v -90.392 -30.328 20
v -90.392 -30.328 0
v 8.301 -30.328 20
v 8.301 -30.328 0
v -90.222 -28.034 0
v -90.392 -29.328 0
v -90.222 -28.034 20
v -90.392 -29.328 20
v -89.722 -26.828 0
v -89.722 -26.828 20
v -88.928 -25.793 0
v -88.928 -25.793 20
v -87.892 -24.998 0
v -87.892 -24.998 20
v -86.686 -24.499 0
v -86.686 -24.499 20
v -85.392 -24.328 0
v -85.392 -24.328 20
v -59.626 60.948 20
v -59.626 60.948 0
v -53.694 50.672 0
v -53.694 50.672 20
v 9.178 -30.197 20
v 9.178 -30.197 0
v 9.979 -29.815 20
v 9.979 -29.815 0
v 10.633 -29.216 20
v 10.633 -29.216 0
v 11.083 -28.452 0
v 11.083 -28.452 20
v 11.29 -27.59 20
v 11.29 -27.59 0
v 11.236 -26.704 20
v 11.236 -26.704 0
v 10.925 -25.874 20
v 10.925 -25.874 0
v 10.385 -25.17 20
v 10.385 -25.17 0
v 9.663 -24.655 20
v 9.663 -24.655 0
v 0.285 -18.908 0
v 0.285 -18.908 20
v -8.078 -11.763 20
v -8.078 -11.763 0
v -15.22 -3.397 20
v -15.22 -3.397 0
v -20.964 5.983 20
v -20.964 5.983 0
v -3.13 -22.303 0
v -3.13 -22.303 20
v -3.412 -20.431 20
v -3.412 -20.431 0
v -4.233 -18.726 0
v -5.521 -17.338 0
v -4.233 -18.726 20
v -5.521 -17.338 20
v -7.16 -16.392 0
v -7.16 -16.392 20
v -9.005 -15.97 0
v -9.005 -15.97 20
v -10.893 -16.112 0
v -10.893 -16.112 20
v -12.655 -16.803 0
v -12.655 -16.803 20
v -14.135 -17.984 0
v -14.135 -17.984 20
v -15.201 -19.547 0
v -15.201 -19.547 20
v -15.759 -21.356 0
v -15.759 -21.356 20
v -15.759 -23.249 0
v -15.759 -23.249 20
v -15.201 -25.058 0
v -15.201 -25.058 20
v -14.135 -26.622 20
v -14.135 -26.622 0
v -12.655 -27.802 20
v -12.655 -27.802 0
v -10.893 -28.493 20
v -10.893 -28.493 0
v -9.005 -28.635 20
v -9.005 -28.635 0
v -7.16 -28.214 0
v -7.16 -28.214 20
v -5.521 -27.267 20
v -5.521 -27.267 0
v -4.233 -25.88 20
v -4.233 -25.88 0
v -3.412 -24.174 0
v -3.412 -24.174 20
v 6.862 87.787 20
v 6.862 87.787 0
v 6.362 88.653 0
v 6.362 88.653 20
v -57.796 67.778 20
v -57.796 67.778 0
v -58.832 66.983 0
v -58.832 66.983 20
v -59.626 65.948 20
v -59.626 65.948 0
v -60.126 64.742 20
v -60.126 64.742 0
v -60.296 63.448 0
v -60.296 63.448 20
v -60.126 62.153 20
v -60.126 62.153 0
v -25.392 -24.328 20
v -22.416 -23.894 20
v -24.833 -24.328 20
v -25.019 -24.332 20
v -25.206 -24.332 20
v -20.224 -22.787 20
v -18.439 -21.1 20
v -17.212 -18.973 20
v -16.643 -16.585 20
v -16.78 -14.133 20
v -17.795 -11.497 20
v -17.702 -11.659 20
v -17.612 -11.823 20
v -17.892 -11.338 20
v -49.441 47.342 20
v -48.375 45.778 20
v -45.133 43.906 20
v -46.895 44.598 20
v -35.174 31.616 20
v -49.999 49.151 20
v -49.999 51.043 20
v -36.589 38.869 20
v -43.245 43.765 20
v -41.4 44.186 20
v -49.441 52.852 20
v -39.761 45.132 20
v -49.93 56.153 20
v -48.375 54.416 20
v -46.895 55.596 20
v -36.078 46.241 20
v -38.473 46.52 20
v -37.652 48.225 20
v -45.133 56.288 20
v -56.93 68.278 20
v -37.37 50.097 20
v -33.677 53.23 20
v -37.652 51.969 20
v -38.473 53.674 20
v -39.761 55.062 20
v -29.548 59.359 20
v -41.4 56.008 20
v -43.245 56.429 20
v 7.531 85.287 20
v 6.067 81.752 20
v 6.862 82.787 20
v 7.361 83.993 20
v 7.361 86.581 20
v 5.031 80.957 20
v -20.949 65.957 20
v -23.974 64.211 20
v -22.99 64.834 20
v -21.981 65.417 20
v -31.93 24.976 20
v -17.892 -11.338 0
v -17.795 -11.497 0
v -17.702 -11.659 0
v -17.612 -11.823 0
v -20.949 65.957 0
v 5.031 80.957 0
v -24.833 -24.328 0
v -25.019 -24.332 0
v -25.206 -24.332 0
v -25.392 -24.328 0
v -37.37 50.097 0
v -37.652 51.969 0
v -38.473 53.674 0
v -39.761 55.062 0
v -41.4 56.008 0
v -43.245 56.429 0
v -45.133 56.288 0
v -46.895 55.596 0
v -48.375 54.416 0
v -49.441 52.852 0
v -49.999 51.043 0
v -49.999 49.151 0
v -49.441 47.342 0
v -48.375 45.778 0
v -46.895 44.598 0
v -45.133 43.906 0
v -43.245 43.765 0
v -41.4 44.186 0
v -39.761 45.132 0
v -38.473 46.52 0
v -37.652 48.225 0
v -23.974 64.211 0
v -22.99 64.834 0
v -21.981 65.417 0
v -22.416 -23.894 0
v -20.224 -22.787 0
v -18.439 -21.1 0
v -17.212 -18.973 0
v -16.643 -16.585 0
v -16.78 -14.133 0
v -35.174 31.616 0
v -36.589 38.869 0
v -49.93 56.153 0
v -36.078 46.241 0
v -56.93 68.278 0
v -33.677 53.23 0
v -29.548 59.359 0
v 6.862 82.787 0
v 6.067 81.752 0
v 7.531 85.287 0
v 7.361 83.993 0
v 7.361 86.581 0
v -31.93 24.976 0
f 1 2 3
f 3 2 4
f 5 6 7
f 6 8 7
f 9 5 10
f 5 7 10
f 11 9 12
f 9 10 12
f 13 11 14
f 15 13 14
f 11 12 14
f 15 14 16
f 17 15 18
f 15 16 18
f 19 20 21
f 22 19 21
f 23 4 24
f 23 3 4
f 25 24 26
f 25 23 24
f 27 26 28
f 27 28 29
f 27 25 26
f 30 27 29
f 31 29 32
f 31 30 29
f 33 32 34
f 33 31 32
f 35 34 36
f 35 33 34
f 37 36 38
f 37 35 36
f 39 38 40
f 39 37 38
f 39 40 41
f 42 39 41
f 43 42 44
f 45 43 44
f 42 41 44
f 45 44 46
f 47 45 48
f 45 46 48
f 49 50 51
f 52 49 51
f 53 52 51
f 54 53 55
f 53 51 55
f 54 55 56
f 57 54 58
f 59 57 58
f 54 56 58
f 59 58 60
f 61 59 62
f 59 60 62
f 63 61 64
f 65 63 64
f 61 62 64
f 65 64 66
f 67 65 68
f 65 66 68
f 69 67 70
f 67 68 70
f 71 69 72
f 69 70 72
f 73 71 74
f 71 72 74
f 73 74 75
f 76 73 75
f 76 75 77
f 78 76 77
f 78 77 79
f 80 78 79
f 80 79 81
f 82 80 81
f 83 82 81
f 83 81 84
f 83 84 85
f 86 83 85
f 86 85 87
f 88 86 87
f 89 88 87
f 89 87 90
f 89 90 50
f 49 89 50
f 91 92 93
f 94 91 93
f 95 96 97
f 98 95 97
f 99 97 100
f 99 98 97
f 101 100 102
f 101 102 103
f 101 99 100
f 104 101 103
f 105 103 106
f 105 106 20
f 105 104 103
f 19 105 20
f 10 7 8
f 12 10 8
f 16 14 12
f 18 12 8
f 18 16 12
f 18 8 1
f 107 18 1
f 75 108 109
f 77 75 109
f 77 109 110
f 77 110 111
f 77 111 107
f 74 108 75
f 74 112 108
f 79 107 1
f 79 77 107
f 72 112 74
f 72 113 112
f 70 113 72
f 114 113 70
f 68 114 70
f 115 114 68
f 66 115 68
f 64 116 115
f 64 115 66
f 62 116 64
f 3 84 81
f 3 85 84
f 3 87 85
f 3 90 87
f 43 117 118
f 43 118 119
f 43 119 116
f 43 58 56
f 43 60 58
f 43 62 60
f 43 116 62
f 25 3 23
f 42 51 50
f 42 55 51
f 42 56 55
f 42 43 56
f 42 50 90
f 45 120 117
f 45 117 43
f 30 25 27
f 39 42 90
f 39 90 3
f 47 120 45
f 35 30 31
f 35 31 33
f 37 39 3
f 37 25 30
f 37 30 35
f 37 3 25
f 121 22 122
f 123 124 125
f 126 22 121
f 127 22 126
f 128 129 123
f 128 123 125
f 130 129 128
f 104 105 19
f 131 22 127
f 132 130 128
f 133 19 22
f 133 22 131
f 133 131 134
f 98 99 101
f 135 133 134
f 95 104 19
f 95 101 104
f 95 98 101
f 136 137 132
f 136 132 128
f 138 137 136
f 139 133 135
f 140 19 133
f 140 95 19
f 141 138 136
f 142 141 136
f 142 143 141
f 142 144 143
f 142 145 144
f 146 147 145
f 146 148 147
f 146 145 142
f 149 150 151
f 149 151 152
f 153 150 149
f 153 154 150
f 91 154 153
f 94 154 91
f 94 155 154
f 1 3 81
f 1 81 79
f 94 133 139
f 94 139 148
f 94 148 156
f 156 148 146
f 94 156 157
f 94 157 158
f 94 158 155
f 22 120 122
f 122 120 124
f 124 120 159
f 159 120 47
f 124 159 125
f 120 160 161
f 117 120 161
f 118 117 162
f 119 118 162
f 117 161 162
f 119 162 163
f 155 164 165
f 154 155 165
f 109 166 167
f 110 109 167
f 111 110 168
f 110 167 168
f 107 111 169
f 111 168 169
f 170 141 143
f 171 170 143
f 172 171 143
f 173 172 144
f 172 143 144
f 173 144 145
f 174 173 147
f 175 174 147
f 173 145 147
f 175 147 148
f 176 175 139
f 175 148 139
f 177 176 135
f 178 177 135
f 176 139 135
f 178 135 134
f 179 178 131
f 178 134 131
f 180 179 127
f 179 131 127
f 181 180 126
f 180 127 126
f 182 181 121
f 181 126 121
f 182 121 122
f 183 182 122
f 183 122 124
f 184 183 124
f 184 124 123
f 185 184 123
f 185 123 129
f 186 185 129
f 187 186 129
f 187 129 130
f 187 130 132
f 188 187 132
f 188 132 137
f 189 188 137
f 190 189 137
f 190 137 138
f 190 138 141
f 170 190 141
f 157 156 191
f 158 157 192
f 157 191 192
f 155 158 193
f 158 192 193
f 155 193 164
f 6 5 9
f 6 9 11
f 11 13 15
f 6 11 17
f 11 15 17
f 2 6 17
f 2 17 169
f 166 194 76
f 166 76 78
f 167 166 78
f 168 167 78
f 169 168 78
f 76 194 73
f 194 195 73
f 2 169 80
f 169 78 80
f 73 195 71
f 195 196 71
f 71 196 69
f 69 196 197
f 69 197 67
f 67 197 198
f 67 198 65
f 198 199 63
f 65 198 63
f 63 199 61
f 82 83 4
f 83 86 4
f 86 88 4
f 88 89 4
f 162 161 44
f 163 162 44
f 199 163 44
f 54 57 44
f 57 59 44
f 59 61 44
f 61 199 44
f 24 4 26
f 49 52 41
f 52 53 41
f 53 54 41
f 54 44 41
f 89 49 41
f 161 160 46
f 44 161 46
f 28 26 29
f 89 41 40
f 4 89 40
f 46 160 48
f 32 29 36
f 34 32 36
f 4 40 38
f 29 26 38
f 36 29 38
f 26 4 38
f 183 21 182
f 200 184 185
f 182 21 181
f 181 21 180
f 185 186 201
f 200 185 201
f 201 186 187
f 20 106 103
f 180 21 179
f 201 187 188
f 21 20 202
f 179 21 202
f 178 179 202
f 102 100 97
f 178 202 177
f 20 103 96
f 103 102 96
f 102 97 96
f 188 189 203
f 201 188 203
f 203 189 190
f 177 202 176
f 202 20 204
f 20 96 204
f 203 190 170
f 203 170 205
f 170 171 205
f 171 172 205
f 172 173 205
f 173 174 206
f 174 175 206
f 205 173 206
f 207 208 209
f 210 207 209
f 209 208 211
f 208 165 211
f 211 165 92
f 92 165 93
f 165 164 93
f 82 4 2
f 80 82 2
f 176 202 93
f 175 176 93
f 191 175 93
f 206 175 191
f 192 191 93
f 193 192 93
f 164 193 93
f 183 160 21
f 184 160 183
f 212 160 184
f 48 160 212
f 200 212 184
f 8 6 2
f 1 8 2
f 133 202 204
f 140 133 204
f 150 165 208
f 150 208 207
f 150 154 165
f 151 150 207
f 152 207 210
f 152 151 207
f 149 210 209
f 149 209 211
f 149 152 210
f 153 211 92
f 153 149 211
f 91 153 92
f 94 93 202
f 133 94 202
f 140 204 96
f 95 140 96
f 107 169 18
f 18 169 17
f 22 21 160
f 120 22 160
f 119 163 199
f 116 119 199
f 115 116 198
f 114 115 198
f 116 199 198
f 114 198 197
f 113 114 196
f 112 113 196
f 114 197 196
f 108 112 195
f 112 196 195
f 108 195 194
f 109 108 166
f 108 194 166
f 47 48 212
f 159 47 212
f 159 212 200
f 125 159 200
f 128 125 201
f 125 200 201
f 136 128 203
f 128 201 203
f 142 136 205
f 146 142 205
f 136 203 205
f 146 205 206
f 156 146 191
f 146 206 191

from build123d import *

# Parameters (mm, degrees)
F1_DEPTH = 20
F2_R     = 5
F3_R     = 6.35
F4_DEPTH = 25
F5_R     = 3


# Not quite as in the source:
# - a feature names something its author has since deleted; it is built from what else it names


with BuildPart() as f1:
    # F0 (on Top) → F1 (new body)
    with BuildSketch(Plane.XY):
        with BuildLine():
            Line((-90.3923048454, -24.3281582892), (-90.392, -30.3281582892))
            Line((-90.392, -30.3281582892), (0, -30.3281582892))
            Line((0, -30.3281582892), (25, -30.3281582892))
            ThreePointArc((25, -30.3281582892), (-1.9589555892, -17.2068745453), (-20.9641016151, 5.9827308433))
            Line((-20.9641016151, 5.9827308433), (-31.9301010618, 24.9763990407))
            ThreePointArc((-31.9301010618, 24.9763990407), (-36.0778921244, 46.2412468008), (-23.9743052597, 64.2106960401))
            ThreePointArc((-23.9743052597, 64.2106960401), (-22.4887853878, 65.1306303747), (-20.9493389483, 65.9571611543))
            Line((-20.9493389483, 65.9571611543), (9.3615501841, 83.4571611543))
            Line((9.3615501841, 83.4571611543), (6.3615501841, 88.653313577))
            Line((6.3615501841, 88.653313577), (-49.9301010618, 56.153313577))
            Line((-49.9301010618, 56.153313577), (-56.9301010618, 68.2776692299))
            Line((-56.9301010618, 68.2776692299), (-62.1262534846, 65.2776692299))
            Line((-62.1262534846, 65.2776692299), (-53.6935750346, 50.6718417108))
            Line((-53.6935750346, 50.6718417108), (-17.8923048454, -11.3377772324))
            ThreePointArc((-17.8923048454, -11.3377772324), (-17.7483786227, -11.5778506661), (-17.6124320417, -11.8225311482))
            Line((-17.6124320417, -11.8225311482), (-10.3923048454, -24.3281582892))
            Line((-10.3923048454, -24.3281582892), (-24.8325592379, -24.3281582892))
            ThreePointArc((-24.8325592379, -24.3281582892), (-25.1124320417, -24.3327653375), (-25.3923048454, -24.3281582892))
            Line((-25.3923048454, -24.3281582892), (-90.3923048454, -24.3281582892))
        make_face()
        with BuildLine():
            ThreePointArc((-17.6124320417, -11.8225311482), (-17.7483786227, -20.0811271137), (-24.8325592379, -24.3281582892))
            Line((-24.8325592379, -24.3281582892), (-10.3923048454, -24.3281582892))
            Line((-10.3923048454, -24.3281582892), (-17.6124320417, -11.8225311482))
        make_face()
    extrude(amount=F1_DEPTH)

    # F2
    f2_edges = [f1.edges().sort_by_distance(p)[0] for p in [
        (-90.392305, -24.328158, 10),
        (-62.126253, 65.277669, 10),
        (9.36155, 83.457161, 10),
    ]]
    fillet(f2_edges, radius=F2_R)

    # F3 (on face) → F4 (cut)
    with BuildSketch(Plane.XY.offset(20)):
        with Locations((-43.719941363, 50.0970014554)):
            Circle(F3_R)
        with Locations((-9.4799492508, -22.3026443273)):
            Circle(F3_R)
    extrude(amount=-F4_DEPTH, mode=Mode.SUBTRACT)

    # F5
    f5_edges = [f1.edges().sort_by_distance(p)[0] for p in [
        (25, -30.328158, 10),
    ]]
    fillet(f5_edges, radius=F5_R)


solid = f1.part
